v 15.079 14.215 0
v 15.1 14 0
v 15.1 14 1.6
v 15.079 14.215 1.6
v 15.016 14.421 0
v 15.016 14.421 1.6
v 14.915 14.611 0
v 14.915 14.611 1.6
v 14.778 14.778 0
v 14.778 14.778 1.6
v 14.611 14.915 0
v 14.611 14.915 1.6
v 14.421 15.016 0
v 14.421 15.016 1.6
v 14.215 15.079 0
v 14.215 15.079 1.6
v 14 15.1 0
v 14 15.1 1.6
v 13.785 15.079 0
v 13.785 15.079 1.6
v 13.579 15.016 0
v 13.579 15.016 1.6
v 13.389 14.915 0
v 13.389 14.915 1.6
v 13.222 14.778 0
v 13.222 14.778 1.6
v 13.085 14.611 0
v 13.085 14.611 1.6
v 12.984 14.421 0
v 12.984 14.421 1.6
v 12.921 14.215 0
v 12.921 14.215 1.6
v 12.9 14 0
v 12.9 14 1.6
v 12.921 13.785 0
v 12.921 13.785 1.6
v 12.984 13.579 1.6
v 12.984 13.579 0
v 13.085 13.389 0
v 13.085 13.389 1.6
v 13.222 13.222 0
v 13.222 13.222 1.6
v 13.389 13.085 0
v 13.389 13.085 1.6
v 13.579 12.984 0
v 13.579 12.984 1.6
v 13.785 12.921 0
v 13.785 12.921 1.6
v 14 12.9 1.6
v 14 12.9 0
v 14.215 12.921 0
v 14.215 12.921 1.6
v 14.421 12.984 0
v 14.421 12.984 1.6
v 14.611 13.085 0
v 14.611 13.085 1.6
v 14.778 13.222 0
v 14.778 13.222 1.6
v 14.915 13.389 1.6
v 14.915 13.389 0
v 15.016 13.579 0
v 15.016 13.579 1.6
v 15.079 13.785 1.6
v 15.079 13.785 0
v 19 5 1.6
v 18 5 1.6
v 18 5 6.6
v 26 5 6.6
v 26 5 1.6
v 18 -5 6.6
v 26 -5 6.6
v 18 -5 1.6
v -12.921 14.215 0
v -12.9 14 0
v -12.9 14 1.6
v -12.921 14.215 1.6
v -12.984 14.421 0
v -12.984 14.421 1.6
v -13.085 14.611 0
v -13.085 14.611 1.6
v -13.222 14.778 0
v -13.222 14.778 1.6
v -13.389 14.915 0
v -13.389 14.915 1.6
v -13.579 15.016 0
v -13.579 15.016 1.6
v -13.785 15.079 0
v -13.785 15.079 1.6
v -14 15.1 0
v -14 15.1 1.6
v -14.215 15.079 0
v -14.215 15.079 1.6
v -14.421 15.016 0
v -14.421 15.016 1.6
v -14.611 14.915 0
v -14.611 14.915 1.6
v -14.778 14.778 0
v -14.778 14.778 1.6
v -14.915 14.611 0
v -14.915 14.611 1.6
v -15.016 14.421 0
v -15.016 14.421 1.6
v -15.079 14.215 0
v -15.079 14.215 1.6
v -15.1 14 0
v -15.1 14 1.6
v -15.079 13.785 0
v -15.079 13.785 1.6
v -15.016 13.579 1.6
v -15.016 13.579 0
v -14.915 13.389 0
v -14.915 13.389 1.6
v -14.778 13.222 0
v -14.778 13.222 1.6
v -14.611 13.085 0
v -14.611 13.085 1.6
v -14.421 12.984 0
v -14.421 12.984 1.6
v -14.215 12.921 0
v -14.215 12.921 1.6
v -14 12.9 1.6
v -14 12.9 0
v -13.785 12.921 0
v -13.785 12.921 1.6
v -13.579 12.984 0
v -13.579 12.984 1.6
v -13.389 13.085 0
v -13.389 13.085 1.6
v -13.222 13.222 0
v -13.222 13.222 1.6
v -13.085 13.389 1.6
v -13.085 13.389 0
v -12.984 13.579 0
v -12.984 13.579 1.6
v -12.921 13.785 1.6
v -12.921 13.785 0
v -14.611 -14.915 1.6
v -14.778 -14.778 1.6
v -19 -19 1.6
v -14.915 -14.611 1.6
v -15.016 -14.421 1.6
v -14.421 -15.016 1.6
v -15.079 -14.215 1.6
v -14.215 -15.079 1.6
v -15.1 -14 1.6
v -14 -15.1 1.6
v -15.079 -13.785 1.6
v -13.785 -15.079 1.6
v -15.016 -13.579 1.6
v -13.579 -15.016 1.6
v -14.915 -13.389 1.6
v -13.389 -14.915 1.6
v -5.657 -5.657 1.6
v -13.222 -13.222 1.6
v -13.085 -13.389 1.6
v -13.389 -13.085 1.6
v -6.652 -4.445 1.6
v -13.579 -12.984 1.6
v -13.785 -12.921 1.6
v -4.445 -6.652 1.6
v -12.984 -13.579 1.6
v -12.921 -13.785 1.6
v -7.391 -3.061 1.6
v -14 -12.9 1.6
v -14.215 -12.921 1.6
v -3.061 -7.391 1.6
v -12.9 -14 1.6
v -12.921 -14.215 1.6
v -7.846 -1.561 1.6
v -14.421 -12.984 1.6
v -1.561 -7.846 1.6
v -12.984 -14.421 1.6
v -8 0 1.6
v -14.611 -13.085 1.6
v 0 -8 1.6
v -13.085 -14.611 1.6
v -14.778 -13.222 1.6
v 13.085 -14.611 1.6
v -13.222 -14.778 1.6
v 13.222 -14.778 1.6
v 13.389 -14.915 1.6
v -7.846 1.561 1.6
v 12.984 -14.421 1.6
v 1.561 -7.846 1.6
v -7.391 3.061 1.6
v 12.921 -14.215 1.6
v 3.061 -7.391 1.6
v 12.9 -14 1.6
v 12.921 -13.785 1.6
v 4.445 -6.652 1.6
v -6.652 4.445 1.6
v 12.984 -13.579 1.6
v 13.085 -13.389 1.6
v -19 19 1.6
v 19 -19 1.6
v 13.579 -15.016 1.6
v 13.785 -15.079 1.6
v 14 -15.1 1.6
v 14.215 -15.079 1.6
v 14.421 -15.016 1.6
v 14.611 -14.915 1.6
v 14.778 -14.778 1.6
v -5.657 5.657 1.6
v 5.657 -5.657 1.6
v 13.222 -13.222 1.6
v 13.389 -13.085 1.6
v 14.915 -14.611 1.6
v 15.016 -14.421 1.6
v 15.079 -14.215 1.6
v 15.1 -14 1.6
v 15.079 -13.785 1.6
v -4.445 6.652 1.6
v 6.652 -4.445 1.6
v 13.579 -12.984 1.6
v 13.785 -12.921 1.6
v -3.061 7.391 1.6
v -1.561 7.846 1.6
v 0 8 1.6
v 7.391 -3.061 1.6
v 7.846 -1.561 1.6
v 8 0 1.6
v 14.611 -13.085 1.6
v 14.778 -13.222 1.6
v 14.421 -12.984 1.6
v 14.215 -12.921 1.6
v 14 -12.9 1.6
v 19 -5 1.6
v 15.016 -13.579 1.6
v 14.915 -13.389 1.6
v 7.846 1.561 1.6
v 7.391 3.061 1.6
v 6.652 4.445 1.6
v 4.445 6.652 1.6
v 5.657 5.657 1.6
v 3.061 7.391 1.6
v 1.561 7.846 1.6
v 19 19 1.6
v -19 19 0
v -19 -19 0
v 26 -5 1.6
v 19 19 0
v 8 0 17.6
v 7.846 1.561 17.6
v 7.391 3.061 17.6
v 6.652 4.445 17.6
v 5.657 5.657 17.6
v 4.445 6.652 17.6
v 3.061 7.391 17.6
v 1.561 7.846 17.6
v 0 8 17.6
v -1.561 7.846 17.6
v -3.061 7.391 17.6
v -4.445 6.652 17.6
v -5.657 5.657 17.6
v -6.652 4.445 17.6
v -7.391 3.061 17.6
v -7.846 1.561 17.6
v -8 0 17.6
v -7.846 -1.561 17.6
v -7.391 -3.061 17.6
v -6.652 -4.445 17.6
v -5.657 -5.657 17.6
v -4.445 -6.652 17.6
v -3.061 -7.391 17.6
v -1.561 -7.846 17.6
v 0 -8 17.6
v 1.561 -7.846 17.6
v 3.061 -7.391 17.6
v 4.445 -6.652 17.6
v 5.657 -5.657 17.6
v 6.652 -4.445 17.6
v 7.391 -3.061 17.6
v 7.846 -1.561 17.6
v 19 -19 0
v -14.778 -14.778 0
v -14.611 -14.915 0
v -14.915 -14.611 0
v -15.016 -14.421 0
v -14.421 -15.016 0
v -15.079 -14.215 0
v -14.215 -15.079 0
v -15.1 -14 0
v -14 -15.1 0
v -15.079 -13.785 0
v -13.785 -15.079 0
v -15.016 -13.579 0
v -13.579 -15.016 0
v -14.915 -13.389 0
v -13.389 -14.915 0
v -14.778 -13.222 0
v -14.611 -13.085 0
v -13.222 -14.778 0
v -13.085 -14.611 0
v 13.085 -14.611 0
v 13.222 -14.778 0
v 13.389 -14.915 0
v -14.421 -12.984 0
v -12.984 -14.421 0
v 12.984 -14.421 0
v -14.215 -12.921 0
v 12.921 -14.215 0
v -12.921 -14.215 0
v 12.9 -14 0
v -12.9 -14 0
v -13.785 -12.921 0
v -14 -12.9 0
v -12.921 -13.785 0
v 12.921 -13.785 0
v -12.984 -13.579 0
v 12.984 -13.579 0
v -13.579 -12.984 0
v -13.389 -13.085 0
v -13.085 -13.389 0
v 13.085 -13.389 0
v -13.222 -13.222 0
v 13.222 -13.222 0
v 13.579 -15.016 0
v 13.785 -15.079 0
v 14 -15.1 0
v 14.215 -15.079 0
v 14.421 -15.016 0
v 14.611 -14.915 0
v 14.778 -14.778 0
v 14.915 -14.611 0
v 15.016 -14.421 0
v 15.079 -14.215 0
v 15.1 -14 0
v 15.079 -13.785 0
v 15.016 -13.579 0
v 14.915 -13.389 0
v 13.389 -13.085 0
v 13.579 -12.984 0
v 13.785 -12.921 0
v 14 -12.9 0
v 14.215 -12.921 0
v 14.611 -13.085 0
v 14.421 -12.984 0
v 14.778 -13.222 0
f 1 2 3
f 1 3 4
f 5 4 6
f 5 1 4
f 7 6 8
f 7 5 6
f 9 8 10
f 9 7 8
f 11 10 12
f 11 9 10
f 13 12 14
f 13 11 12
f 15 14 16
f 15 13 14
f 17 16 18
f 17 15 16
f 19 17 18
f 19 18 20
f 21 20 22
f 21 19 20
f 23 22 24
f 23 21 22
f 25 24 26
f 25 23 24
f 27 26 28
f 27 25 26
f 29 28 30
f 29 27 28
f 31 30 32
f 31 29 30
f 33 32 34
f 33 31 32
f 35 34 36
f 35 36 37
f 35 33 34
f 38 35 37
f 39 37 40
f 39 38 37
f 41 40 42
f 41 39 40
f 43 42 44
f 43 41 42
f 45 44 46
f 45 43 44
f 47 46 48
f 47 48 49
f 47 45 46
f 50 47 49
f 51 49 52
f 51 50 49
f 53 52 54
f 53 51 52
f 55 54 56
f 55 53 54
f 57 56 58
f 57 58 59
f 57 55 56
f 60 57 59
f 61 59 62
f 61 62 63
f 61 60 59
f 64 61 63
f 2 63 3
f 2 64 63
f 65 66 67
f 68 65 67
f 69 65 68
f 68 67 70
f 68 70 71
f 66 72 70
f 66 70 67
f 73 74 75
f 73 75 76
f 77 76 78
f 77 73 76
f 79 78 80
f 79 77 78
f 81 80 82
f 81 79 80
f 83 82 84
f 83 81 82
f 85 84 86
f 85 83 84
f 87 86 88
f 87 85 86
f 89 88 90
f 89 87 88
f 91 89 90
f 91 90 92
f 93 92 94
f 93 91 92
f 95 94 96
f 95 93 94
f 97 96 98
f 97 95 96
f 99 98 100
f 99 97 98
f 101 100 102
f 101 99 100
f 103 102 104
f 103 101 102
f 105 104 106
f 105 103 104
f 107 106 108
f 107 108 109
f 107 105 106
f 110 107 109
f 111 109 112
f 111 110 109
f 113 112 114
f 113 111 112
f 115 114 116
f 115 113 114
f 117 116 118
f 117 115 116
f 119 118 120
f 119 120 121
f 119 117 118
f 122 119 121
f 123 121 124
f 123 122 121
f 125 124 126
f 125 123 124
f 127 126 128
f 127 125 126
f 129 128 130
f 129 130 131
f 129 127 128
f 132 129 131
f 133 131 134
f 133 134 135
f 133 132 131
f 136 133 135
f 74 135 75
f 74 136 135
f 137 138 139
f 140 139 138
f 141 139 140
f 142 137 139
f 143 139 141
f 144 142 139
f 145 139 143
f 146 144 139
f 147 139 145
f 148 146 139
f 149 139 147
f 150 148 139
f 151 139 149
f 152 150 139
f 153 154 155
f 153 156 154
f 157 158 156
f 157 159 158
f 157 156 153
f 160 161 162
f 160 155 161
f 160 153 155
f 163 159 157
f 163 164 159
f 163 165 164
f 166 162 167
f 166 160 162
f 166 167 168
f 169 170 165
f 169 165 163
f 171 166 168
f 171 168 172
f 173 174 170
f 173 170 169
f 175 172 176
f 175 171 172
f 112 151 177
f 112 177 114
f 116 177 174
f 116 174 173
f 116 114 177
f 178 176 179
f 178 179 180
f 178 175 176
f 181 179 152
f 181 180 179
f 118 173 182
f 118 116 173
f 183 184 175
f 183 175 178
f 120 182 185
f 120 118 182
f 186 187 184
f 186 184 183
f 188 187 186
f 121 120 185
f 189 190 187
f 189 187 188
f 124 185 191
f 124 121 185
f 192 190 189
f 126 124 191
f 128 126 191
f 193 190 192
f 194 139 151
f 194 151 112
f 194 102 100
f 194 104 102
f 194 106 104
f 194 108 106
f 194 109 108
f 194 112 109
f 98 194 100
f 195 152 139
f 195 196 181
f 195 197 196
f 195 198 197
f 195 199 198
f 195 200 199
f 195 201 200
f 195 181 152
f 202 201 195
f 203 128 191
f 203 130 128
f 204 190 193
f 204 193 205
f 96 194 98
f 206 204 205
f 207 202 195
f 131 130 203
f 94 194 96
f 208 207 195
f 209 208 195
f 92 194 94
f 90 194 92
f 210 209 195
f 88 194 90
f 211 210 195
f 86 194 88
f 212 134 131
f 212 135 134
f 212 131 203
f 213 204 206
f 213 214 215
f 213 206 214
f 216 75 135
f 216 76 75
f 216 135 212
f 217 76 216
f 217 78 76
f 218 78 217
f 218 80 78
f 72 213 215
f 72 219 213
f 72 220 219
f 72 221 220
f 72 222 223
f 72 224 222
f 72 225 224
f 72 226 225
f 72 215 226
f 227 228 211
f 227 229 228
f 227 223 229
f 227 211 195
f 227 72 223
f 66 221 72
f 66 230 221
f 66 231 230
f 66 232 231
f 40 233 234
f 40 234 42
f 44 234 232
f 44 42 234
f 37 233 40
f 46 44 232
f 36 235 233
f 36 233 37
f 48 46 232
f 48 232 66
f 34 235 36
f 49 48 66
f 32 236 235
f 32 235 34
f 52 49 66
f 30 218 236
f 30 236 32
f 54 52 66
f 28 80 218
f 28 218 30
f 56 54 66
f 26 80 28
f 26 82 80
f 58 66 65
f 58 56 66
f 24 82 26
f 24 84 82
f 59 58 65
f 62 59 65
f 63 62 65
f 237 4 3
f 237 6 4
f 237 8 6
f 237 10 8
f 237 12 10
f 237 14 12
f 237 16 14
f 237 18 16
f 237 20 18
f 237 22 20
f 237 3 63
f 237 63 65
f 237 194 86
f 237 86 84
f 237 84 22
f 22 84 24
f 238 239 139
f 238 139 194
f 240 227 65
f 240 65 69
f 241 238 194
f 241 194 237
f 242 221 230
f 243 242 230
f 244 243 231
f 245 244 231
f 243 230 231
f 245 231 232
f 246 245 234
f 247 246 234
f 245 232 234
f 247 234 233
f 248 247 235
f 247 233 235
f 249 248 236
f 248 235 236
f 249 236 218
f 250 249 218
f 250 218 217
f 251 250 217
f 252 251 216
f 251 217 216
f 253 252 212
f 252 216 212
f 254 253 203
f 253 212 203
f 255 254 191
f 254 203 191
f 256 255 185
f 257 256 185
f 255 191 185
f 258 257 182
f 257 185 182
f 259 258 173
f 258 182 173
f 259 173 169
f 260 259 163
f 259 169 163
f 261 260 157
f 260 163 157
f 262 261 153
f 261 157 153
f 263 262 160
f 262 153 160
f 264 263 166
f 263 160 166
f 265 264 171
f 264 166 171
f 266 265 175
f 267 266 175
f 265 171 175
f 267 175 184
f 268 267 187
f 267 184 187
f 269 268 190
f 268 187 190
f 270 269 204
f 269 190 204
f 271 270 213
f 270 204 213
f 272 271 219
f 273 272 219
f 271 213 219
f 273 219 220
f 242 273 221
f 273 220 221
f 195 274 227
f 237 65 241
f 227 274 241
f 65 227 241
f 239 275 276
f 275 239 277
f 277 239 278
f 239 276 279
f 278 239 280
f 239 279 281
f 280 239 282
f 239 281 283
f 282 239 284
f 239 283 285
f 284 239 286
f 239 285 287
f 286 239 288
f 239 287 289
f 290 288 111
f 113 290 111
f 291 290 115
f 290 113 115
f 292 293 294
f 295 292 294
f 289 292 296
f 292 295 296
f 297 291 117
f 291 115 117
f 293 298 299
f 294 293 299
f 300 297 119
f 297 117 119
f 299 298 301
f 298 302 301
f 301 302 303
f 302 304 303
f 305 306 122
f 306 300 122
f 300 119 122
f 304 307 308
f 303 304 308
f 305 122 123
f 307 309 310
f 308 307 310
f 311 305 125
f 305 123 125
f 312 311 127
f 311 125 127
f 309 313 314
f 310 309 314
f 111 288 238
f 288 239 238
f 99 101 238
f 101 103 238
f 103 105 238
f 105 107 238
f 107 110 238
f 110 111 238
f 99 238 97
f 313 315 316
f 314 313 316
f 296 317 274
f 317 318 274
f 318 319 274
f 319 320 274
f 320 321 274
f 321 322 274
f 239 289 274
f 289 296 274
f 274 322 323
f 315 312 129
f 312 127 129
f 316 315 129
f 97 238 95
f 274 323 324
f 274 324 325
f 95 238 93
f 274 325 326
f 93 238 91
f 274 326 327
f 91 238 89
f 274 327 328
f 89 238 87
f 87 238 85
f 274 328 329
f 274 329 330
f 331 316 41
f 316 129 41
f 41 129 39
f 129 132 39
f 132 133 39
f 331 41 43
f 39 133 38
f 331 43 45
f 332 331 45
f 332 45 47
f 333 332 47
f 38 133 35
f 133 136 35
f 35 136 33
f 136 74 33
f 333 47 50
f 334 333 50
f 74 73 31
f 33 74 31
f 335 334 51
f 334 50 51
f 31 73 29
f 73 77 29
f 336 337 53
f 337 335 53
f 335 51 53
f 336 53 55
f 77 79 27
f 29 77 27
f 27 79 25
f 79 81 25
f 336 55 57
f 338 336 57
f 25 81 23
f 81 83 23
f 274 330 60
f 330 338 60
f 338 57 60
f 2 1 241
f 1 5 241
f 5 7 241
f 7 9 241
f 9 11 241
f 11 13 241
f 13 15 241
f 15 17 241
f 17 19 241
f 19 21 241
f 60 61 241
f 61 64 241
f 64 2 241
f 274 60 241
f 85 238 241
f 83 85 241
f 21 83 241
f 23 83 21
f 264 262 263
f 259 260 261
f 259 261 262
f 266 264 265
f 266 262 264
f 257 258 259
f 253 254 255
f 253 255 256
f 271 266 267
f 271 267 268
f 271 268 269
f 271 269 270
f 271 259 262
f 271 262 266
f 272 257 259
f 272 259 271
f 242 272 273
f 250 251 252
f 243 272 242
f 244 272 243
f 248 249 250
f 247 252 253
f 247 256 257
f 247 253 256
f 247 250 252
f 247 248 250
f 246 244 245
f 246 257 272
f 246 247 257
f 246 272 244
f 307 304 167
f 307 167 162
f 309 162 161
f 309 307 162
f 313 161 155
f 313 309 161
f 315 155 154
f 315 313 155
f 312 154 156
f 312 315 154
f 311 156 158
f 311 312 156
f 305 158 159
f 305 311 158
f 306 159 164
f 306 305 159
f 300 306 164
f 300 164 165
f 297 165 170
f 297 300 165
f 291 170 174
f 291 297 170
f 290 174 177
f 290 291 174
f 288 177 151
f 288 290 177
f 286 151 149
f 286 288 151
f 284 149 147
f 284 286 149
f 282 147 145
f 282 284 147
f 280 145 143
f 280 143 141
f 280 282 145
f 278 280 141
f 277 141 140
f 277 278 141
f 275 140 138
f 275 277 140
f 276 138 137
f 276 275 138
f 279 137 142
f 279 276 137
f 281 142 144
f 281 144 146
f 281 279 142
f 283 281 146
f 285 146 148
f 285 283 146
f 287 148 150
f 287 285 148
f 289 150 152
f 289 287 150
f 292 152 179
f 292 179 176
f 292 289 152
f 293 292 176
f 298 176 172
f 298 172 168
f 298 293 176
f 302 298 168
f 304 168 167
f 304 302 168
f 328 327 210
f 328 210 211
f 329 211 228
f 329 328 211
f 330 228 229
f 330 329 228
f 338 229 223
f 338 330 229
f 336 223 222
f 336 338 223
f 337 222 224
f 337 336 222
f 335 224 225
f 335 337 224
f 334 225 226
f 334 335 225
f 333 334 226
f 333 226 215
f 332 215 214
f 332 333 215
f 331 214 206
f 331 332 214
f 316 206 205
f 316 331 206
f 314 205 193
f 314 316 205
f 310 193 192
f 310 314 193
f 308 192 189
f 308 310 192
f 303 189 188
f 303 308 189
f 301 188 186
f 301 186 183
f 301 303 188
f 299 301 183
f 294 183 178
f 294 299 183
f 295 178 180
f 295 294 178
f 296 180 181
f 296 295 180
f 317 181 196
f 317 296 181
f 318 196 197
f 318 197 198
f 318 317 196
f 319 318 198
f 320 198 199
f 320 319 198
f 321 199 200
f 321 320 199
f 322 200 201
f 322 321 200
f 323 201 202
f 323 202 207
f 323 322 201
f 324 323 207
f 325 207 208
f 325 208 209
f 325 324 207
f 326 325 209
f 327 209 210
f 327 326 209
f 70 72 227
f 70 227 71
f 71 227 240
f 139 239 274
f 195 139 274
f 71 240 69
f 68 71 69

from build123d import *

# Parameters (mm, degrees)
SKETCH_1_W        = 38
SKETCH_1_H        = 38
SKETCH_1_R        = 1.1
USB_38_PCB_DEPTH  = 1.6
EXTRUDE_START     = 1.6
SKETCH_2_R        = 8
EXTRUDE_M12_DEPTH = 16
USB_START         = 1.6
SKETCH_3_W        = 8
SKETCH_3_H        = 10
USB_DEPTH         = 5


with BuildPart() as part:
    # 草图1 → USB摄像头38方PCB占位 (new body)
    with BuildSketch(Plane.XY):
        Rectangle(SKETCH_1_W, SKETCH_1_H)
        with Locations((-14, -14)):
            Circle(SKETCH_1_R, mode=Mode.SUBTRACT)
        with Locations((-14, 14)):
            Circle(SKETCH_1_R, mode=Mode.SUBTRACT)
        with Locations((14, -14)):
            Circle(SKETCH_1_R, mode=Mode.SUBTRACT)
        with Locations((14, 14)):
            Circle(SKETCH_1_R, mode=Mode.SUBTRACT)
    extrude(amount=USB_38_PCB_DEPTH)

    # 草图2 → M12镜头占位 (add)
    with BuildSketch(Plane.XY.offset(EXTRUDE_START)):
        Circle(SKETCH_2_R)
    extrude(amount=EXTRUDE_M12_DEPTH)

    # 草图3 → USB插头接口占位 (add)
    with BuildSketch(Plane.XY.offset(USB_START)):
        with Locations((22, 0)):
            Rectangle(SKETCH_3_W, SKETCH_3_H)
    extrude(amount=USB_DEPTH)


solid = part.part
